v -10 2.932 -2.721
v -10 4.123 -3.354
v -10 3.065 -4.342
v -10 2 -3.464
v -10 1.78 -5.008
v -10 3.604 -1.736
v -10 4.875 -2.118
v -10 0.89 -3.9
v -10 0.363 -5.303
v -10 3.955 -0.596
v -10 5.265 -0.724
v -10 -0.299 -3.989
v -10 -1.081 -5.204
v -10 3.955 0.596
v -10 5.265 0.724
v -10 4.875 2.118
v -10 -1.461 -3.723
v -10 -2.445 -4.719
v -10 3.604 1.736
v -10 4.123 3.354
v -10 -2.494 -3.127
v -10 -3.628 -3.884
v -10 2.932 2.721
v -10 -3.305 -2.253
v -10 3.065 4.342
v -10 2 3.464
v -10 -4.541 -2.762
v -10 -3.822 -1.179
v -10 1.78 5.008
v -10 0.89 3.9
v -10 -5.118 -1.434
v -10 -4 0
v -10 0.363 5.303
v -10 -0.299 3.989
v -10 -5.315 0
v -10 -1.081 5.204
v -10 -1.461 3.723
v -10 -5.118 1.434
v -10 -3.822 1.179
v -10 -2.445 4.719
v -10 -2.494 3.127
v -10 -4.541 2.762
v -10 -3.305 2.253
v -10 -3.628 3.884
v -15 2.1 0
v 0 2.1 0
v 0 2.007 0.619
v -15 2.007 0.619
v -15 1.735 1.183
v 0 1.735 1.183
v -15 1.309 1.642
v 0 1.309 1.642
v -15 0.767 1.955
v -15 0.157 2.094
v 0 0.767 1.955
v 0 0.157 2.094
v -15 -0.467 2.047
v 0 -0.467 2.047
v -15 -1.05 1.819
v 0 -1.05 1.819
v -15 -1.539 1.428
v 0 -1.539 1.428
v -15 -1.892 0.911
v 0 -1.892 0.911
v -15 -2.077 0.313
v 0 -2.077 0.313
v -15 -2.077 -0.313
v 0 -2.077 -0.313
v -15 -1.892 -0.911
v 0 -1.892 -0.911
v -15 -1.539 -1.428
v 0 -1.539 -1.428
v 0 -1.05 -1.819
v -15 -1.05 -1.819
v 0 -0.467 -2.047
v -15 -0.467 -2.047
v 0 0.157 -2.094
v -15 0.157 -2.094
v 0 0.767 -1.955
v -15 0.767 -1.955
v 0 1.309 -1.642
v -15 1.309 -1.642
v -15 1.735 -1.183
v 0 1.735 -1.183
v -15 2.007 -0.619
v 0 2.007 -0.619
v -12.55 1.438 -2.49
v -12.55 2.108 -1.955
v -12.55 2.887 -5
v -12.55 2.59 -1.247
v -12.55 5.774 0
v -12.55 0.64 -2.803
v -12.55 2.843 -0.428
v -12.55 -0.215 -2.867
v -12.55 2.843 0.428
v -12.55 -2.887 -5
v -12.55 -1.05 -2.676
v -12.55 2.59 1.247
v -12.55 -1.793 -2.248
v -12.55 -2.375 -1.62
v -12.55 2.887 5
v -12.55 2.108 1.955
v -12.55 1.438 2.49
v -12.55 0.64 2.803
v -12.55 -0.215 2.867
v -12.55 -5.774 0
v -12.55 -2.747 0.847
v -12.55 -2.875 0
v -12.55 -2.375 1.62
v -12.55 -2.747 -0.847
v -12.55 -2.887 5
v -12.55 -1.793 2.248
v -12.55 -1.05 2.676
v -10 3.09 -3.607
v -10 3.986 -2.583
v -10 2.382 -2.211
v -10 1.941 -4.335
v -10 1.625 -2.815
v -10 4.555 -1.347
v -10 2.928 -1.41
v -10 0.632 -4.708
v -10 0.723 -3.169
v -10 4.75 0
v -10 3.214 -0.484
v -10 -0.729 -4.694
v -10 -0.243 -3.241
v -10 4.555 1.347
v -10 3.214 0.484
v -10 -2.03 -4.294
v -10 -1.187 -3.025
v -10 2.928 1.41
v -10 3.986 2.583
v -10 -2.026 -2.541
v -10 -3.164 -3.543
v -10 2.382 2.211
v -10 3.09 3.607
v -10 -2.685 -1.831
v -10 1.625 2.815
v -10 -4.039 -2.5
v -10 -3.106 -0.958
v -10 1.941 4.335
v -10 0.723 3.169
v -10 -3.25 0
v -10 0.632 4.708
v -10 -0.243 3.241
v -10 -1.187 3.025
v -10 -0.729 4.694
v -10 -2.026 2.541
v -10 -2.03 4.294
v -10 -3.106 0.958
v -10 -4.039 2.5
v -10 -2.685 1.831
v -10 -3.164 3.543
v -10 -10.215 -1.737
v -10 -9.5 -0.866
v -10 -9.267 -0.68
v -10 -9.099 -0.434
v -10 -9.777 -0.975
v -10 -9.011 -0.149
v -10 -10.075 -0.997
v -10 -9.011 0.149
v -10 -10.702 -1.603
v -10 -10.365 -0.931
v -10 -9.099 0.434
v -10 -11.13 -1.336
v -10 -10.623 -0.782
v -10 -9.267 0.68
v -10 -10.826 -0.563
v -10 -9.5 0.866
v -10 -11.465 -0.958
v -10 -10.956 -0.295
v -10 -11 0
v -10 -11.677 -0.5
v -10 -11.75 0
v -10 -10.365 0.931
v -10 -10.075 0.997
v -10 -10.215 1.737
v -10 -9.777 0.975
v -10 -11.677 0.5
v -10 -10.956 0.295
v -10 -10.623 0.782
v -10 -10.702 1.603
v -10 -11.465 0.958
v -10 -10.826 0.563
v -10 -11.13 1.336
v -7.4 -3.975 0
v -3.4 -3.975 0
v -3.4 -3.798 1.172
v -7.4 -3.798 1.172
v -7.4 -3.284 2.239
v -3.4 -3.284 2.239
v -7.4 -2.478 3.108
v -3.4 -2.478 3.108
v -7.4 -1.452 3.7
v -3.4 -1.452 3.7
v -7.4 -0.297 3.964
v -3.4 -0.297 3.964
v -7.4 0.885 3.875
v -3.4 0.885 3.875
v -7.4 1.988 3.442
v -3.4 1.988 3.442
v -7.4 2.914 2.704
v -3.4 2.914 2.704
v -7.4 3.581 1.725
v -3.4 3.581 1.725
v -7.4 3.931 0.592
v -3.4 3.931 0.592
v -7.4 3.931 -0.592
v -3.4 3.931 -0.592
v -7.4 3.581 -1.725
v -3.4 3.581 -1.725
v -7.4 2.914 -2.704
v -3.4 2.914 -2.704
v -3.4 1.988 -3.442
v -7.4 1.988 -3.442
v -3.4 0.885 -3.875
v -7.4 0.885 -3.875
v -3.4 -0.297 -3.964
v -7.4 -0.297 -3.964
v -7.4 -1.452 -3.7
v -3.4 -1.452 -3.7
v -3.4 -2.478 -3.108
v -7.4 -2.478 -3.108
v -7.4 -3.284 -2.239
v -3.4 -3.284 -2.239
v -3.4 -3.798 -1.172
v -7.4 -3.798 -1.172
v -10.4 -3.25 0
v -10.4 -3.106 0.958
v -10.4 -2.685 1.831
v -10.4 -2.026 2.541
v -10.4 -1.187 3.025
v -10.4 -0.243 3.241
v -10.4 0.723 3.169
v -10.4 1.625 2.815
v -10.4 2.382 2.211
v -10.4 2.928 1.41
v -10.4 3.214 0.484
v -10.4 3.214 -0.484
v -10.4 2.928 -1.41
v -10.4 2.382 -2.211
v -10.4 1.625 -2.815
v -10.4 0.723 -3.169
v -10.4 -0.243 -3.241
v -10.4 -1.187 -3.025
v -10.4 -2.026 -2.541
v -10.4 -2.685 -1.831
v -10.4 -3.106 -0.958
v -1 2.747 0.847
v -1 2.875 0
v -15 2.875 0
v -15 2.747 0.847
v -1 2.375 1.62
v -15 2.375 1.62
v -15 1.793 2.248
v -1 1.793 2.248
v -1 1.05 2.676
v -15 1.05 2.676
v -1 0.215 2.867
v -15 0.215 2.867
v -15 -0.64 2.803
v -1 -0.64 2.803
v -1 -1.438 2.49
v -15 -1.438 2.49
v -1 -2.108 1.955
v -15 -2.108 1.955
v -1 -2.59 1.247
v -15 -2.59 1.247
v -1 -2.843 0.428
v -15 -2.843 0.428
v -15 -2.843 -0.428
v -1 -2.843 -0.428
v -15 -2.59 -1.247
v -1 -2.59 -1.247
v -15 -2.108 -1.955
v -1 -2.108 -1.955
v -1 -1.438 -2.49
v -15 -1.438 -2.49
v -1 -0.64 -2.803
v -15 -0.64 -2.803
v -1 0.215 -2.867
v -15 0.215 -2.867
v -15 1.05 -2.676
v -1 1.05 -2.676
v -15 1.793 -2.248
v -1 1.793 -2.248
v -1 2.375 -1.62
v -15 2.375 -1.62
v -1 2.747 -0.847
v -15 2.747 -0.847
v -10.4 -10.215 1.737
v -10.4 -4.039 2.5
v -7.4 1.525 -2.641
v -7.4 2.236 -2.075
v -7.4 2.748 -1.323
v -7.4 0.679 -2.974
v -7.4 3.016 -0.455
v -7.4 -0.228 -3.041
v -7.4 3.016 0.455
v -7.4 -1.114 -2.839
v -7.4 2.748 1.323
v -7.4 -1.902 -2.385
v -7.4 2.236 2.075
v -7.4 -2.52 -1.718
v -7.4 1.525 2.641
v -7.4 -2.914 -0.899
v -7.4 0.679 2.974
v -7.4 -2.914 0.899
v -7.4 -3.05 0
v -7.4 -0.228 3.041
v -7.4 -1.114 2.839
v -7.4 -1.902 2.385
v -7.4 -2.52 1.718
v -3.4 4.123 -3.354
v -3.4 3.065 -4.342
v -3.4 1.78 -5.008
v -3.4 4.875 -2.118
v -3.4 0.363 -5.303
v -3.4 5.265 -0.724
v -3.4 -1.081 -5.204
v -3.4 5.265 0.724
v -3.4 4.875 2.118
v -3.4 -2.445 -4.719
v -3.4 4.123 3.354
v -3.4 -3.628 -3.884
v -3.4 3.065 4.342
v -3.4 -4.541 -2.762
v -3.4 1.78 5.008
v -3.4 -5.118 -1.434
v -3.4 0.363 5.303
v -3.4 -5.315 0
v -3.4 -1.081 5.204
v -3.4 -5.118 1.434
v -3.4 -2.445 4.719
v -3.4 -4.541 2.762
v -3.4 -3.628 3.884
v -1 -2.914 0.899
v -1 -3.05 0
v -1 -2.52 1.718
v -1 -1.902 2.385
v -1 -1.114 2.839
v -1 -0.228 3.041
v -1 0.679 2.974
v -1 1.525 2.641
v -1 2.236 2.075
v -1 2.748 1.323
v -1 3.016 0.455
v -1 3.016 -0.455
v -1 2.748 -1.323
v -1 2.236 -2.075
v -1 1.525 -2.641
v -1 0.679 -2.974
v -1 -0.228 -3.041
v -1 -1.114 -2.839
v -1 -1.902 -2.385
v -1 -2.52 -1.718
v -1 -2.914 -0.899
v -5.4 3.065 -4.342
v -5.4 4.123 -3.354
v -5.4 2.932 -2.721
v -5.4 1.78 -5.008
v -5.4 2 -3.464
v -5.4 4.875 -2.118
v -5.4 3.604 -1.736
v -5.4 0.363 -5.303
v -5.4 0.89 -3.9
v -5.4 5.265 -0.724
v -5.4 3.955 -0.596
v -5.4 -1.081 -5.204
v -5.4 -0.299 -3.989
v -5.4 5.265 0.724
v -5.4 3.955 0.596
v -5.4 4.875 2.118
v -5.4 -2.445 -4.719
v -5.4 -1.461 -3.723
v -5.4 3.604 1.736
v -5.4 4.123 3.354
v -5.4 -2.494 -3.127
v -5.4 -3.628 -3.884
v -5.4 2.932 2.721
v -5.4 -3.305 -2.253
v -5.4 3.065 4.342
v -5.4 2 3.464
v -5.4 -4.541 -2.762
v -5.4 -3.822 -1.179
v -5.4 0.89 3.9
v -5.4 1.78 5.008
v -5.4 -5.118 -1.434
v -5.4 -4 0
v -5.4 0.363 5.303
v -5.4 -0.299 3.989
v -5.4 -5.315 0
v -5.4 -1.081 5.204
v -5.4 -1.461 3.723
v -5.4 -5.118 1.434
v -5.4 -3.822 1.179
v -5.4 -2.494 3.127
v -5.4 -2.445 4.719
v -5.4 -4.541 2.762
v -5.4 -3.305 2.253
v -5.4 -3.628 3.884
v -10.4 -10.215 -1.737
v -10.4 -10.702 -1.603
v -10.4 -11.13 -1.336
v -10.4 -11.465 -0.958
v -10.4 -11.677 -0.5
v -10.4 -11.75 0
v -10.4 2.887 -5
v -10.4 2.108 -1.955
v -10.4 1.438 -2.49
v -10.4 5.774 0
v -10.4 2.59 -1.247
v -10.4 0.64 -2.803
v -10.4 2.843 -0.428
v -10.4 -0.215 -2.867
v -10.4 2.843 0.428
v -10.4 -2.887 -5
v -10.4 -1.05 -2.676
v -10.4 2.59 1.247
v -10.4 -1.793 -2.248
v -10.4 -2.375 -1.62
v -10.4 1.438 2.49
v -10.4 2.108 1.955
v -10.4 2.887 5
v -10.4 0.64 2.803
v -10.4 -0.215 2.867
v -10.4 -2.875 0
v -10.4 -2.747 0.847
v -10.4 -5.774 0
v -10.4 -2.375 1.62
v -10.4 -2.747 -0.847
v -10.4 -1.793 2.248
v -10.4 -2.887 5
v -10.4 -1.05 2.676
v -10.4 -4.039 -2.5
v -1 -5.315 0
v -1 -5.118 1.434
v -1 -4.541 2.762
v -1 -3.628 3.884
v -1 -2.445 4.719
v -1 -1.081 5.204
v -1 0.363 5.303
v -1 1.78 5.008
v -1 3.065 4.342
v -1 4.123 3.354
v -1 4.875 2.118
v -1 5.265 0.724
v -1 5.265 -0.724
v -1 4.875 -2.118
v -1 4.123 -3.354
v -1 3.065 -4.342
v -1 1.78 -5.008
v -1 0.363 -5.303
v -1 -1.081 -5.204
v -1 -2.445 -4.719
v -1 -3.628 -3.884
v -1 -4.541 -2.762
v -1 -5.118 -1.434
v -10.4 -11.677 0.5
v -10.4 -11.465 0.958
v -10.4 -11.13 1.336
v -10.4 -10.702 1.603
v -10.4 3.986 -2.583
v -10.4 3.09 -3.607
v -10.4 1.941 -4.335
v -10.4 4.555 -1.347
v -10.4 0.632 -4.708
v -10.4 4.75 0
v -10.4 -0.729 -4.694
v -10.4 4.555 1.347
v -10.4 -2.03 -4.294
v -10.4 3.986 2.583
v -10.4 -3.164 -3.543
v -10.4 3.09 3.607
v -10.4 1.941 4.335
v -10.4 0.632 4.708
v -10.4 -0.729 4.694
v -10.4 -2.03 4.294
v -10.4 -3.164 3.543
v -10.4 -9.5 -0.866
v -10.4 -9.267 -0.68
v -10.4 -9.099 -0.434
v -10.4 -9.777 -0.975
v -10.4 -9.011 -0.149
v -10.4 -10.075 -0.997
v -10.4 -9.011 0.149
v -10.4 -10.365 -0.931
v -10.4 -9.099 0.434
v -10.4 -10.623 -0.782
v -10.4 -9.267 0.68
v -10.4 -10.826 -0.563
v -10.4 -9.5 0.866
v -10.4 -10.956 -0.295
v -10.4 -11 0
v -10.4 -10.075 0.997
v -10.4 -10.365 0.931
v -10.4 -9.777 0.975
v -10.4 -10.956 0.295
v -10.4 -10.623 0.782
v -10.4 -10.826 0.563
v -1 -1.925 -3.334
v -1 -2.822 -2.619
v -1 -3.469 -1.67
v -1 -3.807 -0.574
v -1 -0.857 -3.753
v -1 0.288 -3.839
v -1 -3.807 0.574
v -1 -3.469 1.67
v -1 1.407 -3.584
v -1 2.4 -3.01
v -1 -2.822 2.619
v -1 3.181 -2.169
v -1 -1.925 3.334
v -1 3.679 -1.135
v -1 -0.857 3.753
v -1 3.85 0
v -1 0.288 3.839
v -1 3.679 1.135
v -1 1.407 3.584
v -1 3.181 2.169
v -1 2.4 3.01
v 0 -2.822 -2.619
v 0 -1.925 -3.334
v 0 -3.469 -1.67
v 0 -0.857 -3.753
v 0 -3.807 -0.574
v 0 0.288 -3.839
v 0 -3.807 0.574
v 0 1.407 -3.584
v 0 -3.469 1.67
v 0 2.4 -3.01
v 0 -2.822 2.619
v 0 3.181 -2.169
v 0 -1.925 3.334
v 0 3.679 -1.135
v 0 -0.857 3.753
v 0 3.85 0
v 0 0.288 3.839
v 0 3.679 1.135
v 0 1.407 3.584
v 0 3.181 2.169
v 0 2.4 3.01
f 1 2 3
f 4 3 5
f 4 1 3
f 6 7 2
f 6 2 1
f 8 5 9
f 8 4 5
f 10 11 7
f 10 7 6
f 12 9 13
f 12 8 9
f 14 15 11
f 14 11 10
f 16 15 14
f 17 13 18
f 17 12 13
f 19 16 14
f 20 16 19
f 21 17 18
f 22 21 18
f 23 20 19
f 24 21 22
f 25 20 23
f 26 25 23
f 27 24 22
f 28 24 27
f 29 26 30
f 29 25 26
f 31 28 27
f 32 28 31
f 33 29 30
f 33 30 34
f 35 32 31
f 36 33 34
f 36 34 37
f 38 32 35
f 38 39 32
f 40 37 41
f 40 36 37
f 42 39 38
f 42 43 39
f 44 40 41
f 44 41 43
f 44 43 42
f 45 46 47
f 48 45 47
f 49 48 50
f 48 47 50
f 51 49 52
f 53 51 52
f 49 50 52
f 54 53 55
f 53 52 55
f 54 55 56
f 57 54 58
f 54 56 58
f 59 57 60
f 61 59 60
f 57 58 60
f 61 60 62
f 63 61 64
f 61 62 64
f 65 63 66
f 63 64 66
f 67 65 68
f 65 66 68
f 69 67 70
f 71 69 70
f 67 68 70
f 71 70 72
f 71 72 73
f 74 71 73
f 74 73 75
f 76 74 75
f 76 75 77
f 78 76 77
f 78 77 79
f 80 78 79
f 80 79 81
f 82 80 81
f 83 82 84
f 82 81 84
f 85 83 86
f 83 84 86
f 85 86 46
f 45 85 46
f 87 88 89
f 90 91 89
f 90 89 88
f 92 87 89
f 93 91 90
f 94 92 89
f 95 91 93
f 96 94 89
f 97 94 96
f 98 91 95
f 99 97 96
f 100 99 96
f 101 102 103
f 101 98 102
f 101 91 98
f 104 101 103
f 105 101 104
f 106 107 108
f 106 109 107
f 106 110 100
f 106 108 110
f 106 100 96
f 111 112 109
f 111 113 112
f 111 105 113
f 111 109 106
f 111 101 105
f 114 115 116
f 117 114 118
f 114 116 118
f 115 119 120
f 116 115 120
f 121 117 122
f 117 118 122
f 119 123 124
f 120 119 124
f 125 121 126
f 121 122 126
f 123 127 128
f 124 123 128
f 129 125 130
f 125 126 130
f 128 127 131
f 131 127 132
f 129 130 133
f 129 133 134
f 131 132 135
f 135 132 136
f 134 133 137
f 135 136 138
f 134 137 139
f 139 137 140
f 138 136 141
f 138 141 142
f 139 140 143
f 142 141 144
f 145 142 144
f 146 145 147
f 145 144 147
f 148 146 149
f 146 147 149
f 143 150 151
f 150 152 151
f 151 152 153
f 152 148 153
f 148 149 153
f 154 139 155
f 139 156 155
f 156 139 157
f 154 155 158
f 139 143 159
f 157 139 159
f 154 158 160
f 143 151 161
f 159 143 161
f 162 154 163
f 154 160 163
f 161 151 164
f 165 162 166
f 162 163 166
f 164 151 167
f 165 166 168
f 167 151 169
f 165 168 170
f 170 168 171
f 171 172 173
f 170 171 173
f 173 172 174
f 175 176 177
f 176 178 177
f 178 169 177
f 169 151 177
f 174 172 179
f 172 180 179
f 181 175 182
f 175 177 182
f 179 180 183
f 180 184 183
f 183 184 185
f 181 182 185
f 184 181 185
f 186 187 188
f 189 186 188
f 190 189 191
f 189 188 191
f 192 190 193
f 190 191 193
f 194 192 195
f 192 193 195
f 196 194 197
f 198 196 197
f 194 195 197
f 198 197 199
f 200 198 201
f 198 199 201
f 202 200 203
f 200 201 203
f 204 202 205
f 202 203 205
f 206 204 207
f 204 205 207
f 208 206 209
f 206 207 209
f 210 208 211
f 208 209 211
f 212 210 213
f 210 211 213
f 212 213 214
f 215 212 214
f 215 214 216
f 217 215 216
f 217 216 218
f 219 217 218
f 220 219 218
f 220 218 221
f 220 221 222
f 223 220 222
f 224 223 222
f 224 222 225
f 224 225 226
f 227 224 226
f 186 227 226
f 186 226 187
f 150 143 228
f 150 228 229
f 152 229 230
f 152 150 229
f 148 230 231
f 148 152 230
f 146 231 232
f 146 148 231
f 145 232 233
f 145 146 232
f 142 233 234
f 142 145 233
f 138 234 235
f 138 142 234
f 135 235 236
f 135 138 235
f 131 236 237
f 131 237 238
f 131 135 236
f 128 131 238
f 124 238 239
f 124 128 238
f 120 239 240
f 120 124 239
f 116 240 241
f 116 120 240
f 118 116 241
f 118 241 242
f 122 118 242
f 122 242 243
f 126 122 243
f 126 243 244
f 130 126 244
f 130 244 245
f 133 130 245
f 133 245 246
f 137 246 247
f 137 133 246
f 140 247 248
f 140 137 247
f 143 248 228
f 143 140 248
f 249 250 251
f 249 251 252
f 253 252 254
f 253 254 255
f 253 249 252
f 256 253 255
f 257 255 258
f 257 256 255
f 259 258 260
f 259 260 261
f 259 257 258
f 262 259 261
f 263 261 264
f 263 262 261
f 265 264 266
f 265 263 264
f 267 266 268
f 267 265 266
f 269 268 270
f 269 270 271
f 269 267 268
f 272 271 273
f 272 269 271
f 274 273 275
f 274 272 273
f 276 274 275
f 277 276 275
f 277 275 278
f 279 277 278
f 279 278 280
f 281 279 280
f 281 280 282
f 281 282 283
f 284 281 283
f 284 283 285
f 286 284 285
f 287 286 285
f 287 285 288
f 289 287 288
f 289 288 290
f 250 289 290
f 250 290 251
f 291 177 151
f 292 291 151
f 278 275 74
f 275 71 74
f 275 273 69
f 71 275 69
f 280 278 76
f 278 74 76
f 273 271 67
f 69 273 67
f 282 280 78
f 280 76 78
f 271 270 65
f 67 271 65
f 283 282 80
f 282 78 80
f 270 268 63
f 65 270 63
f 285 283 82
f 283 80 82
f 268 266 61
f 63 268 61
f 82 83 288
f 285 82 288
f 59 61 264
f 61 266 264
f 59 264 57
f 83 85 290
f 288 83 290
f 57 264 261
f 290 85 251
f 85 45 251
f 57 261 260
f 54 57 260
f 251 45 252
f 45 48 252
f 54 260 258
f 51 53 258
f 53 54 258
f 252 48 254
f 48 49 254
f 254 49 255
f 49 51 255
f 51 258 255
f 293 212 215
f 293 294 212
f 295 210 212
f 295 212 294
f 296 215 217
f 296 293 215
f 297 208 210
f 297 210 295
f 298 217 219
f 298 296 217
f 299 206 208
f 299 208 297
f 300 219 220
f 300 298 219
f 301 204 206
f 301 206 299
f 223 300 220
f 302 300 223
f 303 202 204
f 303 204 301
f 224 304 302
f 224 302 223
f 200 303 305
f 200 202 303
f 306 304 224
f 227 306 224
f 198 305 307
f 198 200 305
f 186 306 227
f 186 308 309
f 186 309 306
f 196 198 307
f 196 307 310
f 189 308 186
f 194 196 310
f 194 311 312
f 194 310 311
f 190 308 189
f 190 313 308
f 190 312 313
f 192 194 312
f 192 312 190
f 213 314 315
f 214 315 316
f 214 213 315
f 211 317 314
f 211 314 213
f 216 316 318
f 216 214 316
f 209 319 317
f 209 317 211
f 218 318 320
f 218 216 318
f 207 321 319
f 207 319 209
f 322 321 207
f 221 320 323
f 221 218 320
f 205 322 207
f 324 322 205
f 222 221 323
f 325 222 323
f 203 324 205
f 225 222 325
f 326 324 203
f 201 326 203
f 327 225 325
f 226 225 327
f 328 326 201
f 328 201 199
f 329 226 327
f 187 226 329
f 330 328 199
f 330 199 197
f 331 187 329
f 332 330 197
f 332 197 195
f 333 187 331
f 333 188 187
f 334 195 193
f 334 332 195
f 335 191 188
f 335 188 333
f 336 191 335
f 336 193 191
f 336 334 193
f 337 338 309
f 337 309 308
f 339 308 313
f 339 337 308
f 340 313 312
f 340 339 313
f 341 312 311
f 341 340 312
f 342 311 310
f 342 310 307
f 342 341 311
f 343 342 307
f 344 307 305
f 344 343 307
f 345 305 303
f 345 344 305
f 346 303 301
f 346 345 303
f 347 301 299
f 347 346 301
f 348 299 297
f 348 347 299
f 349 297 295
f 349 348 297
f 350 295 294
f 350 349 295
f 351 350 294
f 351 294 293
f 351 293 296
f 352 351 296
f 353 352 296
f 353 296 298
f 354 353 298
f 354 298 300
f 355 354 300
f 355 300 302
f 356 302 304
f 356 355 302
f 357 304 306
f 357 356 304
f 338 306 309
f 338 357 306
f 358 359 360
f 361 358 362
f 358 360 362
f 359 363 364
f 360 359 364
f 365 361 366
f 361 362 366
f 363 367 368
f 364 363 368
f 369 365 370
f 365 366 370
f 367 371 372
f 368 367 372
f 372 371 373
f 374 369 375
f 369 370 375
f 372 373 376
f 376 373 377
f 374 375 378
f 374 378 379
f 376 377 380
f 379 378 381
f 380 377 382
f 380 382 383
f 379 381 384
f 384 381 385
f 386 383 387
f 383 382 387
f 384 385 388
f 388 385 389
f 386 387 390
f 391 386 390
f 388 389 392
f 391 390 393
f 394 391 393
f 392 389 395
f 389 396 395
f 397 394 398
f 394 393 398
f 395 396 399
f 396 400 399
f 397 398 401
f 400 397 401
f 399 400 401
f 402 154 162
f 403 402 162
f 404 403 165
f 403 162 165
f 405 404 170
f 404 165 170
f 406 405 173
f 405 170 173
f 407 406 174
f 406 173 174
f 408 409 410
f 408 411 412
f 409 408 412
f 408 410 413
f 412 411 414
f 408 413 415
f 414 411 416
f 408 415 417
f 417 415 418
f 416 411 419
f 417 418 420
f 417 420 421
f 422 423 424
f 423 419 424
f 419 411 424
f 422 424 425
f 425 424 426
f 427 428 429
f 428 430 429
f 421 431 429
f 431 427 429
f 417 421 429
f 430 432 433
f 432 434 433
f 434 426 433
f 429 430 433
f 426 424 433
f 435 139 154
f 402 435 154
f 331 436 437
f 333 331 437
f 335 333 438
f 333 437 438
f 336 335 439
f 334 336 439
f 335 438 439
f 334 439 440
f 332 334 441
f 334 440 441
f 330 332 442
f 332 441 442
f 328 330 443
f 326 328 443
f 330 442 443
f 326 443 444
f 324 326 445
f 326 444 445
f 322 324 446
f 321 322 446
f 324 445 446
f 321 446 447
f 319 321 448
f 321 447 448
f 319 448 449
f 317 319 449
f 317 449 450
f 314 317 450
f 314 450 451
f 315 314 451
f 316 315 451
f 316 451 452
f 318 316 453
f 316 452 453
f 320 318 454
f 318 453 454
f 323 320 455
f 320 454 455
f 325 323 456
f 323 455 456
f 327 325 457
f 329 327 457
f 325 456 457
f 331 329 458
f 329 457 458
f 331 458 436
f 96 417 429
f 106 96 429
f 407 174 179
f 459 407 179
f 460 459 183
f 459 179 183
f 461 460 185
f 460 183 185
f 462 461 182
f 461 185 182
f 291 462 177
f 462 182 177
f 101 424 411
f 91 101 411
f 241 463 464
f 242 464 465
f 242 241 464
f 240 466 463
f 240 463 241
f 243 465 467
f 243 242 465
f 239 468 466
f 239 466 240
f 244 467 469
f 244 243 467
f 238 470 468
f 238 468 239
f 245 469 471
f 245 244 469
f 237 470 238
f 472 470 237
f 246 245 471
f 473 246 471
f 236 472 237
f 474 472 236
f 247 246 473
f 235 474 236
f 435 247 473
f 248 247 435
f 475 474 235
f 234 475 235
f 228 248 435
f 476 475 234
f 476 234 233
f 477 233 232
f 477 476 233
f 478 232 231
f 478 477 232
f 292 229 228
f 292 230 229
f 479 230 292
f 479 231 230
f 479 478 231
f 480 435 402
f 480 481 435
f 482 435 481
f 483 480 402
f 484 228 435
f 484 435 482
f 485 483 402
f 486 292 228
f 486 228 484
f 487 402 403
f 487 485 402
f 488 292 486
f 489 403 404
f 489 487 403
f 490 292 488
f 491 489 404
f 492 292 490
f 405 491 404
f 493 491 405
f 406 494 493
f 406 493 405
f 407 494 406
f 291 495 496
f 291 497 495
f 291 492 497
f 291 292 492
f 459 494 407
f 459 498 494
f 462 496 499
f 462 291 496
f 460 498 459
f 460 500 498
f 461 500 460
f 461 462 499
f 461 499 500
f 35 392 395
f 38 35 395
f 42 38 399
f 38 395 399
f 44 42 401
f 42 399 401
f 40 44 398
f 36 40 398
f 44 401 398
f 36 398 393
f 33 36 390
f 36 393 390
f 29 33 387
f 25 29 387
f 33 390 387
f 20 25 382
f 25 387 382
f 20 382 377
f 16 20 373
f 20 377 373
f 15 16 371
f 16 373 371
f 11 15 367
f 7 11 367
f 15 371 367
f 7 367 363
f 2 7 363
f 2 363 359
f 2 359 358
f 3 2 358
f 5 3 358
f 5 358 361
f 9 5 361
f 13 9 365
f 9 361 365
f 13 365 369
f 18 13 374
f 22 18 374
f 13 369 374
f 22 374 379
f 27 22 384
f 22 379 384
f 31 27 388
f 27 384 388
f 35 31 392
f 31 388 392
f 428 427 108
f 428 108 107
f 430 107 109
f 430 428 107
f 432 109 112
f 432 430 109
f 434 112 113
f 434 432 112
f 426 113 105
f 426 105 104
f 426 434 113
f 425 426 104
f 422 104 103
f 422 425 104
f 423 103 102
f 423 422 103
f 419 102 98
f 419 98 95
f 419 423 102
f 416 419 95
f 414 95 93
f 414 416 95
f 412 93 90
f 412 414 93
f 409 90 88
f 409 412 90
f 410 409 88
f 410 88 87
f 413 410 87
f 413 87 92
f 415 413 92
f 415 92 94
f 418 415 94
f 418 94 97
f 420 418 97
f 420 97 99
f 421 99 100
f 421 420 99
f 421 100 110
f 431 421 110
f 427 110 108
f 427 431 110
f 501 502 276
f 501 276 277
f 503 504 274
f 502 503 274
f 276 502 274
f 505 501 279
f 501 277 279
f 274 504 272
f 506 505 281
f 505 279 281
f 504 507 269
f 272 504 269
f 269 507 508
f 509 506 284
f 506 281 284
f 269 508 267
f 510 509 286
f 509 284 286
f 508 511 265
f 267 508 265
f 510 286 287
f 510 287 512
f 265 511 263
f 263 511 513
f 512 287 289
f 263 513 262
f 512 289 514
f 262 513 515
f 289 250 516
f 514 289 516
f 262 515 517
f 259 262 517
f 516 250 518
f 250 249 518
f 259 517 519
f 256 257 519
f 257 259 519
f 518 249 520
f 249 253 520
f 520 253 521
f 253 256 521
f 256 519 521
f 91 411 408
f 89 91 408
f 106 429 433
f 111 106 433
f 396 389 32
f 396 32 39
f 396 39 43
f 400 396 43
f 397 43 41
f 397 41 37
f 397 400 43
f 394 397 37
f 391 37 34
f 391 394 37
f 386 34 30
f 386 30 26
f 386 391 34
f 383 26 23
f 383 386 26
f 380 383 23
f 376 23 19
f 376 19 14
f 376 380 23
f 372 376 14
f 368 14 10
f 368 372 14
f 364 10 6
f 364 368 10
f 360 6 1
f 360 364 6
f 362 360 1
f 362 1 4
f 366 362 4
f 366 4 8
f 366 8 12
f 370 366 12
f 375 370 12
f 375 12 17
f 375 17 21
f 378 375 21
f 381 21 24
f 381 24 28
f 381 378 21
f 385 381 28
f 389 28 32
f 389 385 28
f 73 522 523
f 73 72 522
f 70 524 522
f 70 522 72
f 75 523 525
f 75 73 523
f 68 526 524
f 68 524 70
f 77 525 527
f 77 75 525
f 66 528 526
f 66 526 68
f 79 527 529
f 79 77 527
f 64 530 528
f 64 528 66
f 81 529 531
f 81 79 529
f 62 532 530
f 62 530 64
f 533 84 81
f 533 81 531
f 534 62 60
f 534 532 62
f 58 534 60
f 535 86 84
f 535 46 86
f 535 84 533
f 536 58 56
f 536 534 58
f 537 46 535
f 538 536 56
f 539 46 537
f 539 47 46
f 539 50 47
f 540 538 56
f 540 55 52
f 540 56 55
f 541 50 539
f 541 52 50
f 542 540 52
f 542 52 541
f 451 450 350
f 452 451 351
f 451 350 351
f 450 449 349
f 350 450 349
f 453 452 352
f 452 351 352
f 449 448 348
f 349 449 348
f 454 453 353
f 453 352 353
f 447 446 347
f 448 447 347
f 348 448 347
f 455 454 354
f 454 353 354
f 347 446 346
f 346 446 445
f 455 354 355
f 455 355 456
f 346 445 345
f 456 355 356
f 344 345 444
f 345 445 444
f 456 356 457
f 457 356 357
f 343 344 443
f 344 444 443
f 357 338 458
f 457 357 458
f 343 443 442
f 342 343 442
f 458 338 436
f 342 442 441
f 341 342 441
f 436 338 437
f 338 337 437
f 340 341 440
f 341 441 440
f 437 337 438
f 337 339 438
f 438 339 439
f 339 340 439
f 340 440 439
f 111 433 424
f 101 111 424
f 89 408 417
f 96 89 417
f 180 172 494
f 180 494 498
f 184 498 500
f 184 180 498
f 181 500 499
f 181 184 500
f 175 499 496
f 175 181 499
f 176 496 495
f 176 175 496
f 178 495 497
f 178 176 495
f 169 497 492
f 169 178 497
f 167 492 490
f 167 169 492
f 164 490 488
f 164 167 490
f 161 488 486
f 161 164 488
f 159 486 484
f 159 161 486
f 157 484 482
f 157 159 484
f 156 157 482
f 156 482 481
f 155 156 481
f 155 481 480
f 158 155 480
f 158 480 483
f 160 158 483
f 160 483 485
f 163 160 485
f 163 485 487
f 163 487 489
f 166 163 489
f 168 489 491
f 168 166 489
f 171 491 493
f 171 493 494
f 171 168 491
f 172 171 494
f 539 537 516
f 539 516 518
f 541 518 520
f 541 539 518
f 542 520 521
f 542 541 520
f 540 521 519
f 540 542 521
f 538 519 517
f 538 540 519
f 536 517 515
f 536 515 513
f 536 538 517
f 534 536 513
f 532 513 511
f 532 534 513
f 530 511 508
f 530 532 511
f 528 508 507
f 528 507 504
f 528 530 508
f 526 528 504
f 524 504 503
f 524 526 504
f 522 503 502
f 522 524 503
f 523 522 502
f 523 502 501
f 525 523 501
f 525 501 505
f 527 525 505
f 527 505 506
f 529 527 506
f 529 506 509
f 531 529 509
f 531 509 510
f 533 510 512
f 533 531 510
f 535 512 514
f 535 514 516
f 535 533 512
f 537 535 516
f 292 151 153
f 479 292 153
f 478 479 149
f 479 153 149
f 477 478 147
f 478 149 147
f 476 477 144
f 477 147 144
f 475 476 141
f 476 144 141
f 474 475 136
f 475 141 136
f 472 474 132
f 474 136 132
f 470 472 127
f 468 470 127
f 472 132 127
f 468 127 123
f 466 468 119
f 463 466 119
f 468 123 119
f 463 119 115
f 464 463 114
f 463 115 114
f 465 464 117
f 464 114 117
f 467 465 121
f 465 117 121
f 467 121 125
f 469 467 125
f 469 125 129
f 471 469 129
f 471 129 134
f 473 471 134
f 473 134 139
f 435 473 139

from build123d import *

# Parameters (mm, degrees)
F0_R      = 2.875
F0_R_2    = 2.1
F1_DEPTH  = 15
F0_R_3    = 3.85
F2_DEPTH  = 1
F3_R      = 3.975
F3_R_2    = 3.85
F3_R_3    = 3.05
F4_DEPTH  = 6.4
F3_R_4    = 5.315
F5_DEPTH  = 2.4
F7_R      = 5.315
F7_R_2    = 4
F8_DEPTH  = 4.6
F9_R      = 3.25
F9_R_2    = 1
F10_DEPTH = 0.4
F11_R     = 2.875
F12_DEPTH = 2.15


with BuildPart() as f1:
    # F0 (on Right) → F1 (new body)
    with BuildSketch(Plane.YZ):
        Circle(F0_R)
        Circle(F0_R_2, mode=Mode.SUBTRACT)
    extrude(amount=-F1_DEPTH)

    # F0 (on Right) → F2 (join)
    with BuildSketch(Plane.YZ):
        Circle(F0_R_3)
        Circle(F0_R, mode=Mode.SUBTRACT)
    extrude(amount=-F2_DEPTH)


with BuildPart() as f4:
    # F3 (on face) → F4 (new body)
    with BuildSketch(Plane(origin=(-1, 0, 0), x_dir=(0, -1, 0), z_dir=(-1, 0, 0))):
        Circle(F3_R)
        Circle(F3_R_2, mode=Mode.SUBTRACT)
        Circle(F3_R_2)
        Circle(F3_R_3, mode=Mode.SUBTRACT)
    extrude(amount=F4_DEPTH)

    # F3 (on face) → F5 (join)
    with BuildSketch(Plane(origin=(-1, 0, 0), x_dir=(0, -1, 0), z_dir=(-1, 0, 0))):
        Circle(F3_R_4)
        Circle(F3_R, mode=Mode.SUBTRACT)
    extrude(amount=F5_DEPTH)


with BuildPart() as f8:
    # F7 (on offset) → F8 (new body)
    with BuildSketch(Plane(origin=(-5.4, 0, 0), x_dir=(0, -1, 0), z_dir=(-1, 0, 0))):
        Circle(F7_R)
        Circle(F7_R_2, mode=Mode.SUBTRACT)
    extrude(amount=F8_DEPTH)


with BuildPart() as f10:
    # F9 (on face) → F10 (new body)
    with BuildSketch(Plane(origin=(-10, 0, 0), x_dir=(0, -1, 0), z_dir=(-1, 0, 0))):
        with BuildLine():
            ThreePointArc((4.038874, -2.5), (4.568761, -1.299587), (4.75, 0))
            ThreePointArc((4.75, 0), (4.568761, 1.299587), (4.038874, 2.5))
            ThreePointArc((4.038874, 2.5), (-4.75, 0), (4.038874, -2.5))
        make_face()
        Circle(F9_R, mode=Mode.SUBTRACT)
        with BuildLine():
            ThreePointArc((4.038874, 2.5), (4.568761, 1.299587), (4.75, 0))
            ThreePointArc((4.75, 0), (4.568761, -1.299587), (4.038874, -2.5))
            Line((4.038874, -2.5), (10.214635, -1.736788))
            ThreePointArc((10.214635, -1.736788), (8.25, 0), (10.214635, 1.736788))
            Line((10.214635, 1.736788), (4.038874, 2.5))
        make_face()
        with BuildLine():
            ThreePointArc((11.75, 0), (11.311128, 1.15907), (10.214635, 1.736788))
            ThreePointArc((10.214635, 1.736788), (8.25, 0), (10.214635, -1.736788))
            ThreePointArc((10.214635, -1.736788), (11.311128, -1.15907), (11.75, 0))
        make_face()
        with Locations((10, 0)):
            Circle(F9_R_2, mode=Mode.SUBTRACT)
    extrude(amount=F10_DEPTH)


with BuildPart() as f12:
    # F11 (on face) → F12 (new body)
    with BuildSketch(Plane(origin=(-10.4, 0, 0), x_dir=(0, -1, 0), z_dir=(-1, 0, 0))):
        Polygon((5.773503, 0), (2.886751, 5), (-2.886751, 5), (-5.773503, 0), (-2.886751, -5), (2.886751, -5), align=None)
        Circle(F11_R, mode=Mode.SUBTRACT)
    extrude(amount=F12_DEPTH)


solid = Compound([f1.part, f4.part, f8.part, f10.part, f12.part])
